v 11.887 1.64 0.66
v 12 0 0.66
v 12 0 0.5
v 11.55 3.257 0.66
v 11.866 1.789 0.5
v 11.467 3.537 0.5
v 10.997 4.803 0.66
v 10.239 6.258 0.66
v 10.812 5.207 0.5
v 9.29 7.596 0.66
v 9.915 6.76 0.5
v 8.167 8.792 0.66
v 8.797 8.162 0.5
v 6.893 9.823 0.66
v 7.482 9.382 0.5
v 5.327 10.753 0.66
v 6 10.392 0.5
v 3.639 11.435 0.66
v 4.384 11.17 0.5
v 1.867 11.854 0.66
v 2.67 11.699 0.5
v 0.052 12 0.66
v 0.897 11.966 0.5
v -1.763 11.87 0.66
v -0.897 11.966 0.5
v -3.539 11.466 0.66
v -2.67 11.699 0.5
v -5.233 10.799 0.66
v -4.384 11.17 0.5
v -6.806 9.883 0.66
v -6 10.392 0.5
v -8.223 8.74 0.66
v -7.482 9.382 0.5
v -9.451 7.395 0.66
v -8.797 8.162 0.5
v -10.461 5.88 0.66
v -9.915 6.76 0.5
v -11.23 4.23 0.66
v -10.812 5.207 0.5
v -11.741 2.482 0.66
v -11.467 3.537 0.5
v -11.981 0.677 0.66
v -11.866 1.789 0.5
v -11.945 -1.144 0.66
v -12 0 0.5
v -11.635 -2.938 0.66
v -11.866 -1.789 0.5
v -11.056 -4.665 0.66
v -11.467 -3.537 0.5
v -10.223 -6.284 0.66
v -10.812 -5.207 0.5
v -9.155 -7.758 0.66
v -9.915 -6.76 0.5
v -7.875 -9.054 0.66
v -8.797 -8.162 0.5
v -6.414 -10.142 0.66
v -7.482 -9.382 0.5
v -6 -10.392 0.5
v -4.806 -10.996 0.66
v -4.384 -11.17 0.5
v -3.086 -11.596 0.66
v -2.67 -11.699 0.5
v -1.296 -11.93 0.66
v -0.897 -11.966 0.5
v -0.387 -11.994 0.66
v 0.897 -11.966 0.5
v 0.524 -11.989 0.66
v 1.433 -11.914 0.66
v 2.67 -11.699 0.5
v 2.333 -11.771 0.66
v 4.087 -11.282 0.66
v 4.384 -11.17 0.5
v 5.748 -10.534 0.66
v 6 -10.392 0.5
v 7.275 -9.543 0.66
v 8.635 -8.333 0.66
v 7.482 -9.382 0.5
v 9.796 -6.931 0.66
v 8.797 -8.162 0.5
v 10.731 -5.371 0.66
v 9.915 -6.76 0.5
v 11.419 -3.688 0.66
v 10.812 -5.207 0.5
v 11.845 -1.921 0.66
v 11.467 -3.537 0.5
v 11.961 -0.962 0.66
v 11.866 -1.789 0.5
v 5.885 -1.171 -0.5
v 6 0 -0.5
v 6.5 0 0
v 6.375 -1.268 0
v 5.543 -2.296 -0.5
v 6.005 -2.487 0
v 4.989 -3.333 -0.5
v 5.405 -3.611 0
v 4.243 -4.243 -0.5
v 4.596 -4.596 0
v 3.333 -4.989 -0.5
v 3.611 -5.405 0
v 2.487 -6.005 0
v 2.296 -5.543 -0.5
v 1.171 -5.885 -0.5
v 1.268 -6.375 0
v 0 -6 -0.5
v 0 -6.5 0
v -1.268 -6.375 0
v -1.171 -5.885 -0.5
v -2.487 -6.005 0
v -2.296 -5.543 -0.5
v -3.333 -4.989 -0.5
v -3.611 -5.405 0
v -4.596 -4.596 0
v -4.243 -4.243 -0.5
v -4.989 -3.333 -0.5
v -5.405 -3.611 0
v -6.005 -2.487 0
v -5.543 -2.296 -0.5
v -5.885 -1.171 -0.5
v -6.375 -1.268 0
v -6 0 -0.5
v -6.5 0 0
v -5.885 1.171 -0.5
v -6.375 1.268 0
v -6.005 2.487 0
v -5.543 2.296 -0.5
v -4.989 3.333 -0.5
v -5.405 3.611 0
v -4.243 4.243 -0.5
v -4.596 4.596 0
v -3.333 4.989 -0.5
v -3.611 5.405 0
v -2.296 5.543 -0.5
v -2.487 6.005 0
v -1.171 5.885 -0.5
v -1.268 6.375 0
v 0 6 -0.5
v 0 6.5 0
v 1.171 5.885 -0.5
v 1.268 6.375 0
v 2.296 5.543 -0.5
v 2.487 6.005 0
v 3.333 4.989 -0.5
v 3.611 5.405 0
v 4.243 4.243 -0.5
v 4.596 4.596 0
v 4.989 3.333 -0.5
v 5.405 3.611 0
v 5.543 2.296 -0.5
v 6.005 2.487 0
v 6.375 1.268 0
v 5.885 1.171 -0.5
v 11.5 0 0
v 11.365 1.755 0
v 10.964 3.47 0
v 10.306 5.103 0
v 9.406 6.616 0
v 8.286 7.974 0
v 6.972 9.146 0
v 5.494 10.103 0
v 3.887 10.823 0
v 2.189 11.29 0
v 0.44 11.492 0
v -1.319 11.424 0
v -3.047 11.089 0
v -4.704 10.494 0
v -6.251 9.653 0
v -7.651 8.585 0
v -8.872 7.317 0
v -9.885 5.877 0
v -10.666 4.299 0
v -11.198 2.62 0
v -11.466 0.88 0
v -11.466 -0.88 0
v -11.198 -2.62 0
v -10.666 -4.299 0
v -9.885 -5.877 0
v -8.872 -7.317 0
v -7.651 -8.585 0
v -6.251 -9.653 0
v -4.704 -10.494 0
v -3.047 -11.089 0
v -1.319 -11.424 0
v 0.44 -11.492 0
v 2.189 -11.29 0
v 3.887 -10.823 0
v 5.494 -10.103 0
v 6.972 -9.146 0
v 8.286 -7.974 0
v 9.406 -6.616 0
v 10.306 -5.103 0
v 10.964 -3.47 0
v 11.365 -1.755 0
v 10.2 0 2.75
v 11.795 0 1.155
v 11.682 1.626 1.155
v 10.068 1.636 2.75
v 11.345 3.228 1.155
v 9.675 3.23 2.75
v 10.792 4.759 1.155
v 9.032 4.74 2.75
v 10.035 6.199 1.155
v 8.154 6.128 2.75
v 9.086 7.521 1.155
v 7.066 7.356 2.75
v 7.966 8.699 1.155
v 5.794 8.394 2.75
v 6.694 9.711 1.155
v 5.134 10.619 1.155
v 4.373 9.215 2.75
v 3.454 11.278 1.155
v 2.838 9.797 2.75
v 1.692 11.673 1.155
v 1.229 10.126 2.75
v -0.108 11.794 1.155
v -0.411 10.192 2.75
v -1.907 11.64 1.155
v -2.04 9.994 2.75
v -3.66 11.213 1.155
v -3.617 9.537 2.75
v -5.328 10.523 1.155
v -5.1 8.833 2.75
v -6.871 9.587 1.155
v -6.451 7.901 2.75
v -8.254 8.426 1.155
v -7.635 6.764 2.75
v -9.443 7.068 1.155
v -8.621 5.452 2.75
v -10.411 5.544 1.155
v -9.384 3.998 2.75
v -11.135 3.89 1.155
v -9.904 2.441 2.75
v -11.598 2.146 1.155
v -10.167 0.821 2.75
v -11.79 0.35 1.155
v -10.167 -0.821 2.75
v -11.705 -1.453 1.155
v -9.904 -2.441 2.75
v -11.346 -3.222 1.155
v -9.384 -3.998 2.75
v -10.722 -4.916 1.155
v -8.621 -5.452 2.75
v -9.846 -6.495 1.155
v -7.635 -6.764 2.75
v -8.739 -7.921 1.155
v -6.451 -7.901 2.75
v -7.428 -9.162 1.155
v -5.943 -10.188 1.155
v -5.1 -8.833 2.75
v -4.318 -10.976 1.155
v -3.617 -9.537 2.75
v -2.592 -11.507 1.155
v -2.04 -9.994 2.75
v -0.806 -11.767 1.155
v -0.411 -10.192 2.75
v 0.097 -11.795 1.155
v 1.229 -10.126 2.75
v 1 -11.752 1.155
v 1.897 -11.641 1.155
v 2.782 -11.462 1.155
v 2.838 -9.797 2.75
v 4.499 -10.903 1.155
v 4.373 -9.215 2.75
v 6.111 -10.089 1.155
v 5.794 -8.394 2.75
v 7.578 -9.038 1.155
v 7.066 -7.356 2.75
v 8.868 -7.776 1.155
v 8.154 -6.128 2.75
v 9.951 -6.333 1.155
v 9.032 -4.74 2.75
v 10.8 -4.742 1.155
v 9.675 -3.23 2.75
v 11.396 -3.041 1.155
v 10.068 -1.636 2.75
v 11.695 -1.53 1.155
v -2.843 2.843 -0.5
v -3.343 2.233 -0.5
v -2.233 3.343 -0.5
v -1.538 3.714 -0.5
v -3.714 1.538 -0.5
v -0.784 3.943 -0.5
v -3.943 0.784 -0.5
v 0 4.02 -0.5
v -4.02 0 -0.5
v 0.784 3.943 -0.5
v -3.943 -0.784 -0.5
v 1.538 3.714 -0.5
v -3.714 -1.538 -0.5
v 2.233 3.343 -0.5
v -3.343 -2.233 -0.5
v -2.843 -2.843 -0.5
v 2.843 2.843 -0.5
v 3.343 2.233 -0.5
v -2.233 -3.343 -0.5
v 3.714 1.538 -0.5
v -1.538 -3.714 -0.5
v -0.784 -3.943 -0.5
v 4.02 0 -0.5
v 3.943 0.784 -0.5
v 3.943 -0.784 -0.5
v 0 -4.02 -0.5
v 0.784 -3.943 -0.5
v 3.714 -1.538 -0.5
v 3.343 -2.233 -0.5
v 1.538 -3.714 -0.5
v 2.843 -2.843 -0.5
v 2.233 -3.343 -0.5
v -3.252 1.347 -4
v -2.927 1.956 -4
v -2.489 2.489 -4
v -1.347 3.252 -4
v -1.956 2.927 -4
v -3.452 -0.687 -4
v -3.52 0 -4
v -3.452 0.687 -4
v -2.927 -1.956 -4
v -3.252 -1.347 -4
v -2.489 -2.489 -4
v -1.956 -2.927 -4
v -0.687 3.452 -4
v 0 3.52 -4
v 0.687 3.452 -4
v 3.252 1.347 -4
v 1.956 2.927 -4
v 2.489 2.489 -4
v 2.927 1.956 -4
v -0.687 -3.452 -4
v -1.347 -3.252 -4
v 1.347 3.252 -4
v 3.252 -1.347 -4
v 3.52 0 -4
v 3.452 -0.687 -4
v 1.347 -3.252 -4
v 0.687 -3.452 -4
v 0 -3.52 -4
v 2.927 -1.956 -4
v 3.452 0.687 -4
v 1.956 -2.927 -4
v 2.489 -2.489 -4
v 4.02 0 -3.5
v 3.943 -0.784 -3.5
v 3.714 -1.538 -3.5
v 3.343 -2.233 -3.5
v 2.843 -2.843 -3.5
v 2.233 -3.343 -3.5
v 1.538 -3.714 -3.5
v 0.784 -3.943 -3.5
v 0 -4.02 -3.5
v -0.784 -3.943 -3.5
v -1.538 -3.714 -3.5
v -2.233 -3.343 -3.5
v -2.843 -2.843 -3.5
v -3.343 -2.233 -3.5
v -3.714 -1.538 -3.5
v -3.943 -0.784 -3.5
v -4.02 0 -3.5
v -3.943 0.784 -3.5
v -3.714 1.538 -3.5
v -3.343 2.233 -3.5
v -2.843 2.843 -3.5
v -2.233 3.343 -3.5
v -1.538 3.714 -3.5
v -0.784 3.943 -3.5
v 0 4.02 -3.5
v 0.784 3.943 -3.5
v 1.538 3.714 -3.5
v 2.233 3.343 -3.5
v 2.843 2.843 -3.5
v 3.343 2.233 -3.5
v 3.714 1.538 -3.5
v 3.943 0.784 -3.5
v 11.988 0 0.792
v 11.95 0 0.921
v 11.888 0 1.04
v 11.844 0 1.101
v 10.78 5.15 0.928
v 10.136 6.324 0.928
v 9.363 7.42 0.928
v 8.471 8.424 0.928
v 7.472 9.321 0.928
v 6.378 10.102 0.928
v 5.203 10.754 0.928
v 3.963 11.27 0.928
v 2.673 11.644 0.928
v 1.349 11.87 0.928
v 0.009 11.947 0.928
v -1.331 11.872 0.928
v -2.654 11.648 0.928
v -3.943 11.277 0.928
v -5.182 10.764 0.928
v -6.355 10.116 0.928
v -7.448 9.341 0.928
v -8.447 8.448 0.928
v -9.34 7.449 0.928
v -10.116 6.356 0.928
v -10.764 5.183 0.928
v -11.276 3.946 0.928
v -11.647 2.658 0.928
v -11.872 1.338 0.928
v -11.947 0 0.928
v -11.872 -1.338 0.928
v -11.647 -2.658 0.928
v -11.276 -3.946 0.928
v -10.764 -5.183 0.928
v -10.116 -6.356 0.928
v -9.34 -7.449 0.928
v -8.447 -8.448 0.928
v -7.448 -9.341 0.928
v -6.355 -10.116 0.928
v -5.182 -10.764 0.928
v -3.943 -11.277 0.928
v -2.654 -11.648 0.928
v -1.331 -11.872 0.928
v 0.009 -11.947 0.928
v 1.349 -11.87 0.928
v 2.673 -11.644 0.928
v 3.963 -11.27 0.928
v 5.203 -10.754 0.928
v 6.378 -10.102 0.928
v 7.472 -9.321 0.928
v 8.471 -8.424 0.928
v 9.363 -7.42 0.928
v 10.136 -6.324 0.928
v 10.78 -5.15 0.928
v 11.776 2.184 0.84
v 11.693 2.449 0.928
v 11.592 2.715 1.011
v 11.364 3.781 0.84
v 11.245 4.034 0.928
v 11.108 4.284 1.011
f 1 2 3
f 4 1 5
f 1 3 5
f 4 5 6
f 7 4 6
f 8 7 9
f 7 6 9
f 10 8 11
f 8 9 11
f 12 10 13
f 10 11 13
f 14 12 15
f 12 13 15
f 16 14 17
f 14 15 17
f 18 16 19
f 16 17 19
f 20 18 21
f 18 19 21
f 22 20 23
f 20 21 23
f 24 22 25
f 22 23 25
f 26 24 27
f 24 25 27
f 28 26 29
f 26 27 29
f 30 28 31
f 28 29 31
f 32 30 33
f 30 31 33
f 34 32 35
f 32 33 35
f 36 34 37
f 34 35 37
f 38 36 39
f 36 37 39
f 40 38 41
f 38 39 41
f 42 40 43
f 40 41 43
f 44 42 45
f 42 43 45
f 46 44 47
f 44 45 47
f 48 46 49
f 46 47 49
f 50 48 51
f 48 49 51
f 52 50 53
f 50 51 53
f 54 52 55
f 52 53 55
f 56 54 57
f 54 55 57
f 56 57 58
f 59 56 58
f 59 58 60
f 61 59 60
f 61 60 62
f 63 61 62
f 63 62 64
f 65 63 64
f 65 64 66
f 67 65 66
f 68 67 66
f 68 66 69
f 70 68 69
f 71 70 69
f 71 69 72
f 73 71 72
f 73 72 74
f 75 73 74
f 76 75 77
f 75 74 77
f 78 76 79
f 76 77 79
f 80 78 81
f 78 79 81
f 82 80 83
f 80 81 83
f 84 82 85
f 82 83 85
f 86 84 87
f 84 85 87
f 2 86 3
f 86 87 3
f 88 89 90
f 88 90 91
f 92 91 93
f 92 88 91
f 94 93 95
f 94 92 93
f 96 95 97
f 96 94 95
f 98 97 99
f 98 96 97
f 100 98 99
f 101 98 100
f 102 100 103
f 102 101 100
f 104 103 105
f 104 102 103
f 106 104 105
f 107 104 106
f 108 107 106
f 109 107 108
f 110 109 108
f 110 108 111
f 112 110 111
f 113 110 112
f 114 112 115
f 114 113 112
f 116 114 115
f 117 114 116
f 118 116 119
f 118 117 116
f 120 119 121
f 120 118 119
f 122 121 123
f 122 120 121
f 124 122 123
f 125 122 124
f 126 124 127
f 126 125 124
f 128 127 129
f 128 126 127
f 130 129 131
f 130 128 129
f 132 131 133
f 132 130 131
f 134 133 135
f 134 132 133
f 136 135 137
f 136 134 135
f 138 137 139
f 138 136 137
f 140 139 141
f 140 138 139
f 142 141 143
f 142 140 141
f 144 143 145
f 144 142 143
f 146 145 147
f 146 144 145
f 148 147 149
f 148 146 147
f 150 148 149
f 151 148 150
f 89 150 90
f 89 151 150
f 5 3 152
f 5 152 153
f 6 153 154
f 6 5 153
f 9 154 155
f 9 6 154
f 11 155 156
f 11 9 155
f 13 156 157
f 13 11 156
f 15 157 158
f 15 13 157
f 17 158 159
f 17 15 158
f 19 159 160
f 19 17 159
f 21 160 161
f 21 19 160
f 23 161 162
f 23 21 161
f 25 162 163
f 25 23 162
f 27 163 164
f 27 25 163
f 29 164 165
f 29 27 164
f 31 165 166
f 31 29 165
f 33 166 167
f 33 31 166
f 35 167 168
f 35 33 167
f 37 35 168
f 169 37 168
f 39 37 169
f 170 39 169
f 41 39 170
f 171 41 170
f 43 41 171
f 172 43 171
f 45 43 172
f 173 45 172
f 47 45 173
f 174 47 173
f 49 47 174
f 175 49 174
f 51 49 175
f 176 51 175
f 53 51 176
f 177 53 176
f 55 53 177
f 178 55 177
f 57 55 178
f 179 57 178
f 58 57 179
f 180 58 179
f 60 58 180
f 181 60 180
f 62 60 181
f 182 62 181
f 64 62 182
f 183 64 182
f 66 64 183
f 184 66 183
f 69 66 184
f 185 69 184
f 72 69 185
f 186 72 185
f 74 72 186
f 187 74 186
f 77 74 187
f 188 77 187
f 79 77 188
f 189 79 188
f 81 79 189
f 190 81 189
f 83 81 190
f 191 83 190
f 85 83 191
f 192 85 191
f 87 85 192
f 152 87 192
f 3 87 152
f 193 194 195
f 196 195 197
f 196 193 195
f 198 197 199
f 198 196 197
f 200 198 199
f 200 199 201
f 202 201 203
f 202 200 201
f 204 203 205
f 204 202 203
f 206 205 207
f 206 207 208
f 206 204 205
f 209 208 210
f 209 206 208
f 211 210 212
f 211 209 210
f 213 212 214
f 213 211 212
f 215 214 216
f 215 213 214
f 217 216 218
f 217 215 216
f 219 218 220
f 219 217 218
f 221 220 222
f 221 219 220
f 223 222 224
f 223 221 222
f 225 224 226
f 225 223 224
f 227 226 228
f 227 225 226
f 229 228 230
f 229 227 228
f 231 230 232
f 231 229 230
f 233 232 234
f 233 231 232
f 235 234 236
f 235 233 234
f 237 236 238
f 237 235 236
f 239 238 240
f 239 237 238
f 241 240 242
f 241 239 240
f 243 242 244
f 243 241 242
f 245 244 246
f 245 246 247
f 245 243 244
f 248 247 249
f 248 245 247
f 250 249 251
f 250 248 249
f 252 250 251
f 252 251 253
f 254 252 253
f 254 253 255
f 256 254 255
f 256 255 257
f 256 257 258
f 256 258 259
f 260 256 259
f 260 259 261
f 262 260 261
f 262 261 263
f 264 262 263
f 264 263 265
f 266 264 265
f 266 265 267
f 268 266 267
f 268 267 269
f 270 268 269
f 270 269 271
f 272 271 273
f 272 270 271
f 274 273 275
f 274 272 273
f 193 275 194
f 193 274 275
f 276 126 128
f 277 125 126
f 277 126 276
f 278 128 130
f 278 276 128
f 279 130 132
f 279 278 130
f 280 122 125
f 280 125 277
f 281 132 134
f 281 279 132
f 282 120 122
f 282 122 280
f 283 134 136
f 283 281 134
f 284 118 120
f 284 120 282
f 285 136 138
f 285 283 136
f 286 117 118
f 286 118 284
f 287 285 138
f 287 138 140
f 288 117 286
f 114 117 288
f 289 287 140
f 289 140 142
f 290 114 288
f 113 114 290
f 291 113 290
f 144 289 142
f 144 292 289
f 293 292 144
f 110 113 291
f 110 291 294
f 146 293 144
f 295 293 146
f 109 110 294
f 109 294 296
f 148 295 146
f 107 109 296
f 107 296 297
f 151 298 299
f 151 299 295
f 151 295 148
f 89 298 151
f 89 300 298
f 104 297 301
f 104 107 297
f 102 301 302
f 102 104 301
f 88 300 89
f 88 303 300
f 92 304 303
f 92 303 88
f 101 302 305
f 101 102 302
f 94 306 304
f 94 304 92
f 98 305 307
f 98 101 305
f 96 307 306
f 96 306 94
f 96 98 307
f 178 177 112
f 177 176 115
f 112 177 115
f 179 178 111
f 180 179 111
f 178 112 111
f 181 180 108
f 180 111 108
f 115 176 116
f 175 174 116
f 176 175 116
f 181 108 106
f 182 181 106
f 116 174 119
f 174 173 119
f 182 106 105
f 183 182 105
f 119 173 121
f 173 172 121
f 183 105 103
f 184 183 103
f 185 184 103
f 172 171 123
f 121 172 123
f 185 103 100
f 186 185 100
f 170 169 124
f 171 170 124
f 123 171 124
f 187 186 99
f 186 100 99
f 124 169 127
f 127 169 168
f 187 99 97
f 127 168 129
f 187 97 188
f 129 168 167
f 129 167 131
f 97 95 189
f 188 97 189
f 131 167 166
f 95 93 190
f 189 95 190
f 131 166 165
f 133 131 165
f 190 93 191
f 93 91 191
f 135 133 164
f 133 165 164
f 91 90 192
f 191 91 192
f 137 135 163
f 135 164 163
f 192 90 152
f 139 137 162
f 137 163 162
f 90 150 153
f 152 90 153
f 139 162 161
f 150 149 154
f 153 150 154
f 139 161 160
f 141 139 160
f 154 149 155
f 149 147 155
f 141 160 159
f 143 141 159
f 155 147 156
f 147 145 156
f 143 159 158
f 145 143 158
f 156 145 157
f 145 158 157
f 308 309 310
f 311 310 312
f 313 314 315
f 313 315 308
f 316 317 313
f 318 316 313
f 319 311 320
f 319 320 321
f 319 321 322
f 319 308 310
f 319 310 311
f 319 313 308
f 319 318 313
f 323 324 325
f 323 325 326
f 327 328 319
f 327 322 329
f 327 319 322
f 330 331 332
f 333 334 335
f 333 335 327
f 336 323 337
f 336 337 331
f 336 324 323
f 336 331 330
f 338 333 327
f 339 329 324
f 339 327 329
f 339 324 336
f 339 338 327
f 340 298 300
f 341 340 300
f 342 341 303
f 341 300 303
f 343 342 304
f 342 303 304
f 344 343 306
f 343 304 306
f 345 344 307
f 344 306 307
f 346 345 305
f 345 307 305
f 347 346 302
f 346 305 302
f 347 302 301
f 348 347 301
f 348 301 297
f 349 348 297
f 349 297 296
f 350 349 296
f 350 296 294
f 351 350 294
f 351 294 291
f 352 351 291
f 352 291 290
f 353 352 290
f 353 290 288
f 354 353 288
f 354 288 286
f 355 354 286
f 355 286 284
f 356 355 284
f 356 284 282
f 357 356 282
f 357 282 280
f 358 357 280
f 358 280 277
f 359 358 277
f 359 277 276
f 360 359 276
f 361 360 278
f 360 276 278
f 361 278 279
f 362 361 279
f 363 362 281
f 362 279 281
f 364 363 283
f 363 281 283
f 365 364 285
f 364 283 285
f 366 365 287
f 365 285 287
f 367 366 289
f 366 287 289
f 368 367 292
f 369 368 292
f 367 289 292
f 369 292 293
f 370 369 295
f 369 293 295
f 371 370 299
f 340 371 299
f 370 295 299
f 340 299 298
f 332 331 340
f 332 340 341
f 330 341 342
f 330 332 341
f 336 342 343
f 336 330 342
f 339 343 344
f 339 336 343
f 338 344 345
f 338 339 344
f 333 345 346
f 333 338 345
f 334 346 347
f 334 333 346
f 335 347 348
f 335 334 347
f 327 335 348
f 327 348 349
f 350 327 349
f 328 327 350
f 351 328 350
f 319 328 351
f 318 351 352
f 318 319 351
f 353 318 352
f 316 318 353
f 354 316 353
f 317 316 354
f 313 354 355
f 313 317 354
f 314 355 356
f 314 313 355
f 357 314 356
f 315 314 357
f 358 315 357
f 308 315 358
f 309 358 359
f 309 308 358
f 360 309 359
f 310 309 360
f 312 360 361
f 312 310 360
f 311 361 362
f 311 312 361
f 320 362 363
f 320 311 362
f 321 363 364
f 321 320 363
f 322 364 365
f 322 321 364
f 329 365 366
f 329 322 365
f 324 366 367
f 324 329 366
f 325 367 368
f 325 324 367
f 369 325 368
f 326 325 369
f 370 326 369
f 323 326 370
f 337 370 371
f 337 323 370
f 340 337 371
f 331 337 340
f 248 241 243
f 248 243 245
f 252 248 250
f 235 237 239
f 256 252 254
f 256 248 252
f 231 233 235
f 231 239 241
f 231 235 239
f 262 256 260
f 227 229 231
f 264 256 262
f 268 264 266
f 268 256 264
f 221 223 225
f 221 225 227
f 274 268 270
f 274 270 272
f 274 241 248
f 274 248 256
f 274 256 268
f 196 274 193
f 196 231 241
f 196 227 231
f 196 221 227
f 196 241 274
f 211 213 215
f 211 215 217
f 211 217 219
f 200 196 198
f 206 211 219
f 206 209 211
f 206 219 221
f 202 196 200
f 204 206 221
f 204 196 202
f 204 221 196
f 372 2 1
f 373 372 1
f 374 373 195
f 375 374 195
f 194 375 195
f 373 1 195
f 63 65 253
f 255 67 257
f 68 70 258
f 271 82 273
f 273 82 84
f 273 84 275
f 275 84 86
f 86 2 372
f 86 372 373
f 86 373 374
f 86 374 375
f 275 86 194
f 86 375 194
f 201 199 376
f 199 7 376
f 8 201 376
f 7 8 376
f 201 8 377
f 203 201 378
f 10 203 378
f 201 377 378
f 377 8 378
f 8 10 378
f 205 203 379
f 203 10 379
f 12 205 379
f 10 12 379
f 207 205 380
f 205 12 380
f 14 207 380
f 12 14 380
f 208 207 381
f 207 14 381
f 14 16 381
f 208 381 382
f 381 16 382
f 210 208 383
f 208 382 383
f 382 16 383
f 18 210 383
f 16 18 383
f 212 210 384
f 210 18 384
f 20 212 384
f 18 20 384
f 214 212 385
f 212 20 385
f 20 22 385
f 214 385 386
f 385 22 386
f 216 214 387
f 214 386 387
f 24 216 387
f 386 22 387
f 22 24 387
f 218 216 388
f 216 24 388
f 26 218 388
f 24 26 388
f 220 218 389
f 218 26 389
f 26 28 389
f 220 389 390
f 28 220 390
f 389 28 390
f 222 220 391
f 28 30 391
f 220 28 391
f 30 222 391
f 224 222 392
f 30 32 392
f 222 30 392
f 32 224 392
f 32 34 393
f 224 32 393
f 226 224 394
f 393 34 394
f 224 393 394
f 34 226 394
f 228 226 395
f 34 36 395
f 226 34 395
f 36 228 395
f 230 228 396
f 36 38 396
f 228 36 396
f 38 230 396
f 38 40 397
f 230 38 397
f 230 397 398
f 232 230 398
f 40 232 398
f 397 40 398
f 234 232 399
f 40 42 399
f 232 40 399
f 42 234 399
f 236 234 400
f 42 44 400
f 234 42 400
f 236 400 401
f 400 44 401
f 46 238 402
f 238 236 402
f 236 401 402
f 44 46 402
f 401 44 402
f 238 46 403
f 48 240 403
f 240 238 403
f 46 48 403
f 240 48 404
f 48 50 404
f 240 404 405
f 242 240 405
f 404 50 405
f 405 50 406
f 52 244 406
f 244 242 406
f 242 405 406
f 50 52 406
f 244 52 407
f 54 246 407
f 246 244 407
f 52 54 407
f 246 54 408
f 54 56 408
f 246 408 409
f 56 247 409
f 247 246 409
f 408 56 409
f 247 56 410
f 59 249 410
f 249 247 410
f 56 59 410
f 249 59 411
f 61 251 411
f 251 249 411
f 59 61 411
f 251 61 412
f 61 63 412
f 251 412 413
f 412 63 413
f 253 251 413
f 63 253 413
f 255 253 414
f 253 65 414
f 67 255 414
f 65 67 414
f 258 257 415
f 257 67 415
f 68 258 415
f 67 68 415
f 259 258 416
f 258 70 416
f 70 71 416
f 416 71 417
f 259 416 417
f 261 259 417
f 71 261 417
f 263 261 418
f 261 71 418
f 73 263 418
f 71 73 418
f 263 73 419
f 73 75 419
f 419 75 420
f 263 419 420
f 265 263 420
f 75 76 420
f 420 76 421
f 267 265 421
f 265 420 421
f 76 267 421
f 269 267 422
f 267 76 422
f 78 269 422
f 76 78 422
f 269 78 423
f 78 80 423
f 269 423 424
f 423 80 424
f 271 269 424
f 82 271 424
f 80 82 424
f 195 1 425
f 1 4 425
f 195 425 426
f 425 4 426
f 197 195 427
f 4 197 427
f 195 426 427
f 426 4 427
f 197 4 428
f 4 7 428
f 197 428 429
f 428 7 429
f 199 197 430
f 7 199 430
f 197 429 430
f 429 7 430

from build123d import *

# Parameters (mm, degrees)
F0_R     = 12
F1_DEPTH = 2.75
F2_R     = 4.02
F3_DEPTH = 4
F4_R     = 6.5
F5_DEPTH = 0.5
F6_SIZE  = 0.49999
F7_SIZE  = 1.8
F8_R     = 0.7


# Not quite as in the source:
# - a fillet or chamfer is up to 0.001 mm smaller than in the source, because OpenCascade refuses the exact size


with BuildPart() as f1:
    # F0 (on Top) → F1 (new body)
    with BuildSketch(Plane.XY):
        Circle(F0_R)
    extrude(amount=F1_DEPTH)

    # F2 (on face) → F3 (join)
    with BuildSketch(Plane(origin=(0, 0, 0), x_dir=(1, 0, 0), z_dir=(0, 0, -1))):
        Circle(F2_R)
    extrude(amount=F3_DEPTH)

    # F4 (on face) → F5 (join)
    with BuildSketch(Plane(origin=(0, 0, 0), x_dir=(1, 0, 0), z_dir=(0, 0, -1))):
        Circle(F4_R)
    extrude(amount=F5_DEPTH)

    # F6 (size 0.5 in the source; OpenCascade refuses exactly that, so slightly less here)
    f6_edges = [f1.edges().sort_by_distance(p)[0] for p in [
        (-6.5, 0, -0.5),
        (-4.02, 0, -4),
        (-12, 0, 0),
    ]]
    chamfer(f6_edges, length=F6_SIZE)

    # F7
    f7_edges = [f1.edges().sort_by_distance(p)[0] for p in [
        (-12, 0, 2.75),
    ]]
    chamfer(f7_edges, length=F7_SIZE)

    # F8
    f8_edges = [f1.edges().sort_by_distance(p)[0] for p in [
        (-12, 0, 0.95),
    ]]
    fillet(f8_edges, radius=F8_R)


solid = f1.part
